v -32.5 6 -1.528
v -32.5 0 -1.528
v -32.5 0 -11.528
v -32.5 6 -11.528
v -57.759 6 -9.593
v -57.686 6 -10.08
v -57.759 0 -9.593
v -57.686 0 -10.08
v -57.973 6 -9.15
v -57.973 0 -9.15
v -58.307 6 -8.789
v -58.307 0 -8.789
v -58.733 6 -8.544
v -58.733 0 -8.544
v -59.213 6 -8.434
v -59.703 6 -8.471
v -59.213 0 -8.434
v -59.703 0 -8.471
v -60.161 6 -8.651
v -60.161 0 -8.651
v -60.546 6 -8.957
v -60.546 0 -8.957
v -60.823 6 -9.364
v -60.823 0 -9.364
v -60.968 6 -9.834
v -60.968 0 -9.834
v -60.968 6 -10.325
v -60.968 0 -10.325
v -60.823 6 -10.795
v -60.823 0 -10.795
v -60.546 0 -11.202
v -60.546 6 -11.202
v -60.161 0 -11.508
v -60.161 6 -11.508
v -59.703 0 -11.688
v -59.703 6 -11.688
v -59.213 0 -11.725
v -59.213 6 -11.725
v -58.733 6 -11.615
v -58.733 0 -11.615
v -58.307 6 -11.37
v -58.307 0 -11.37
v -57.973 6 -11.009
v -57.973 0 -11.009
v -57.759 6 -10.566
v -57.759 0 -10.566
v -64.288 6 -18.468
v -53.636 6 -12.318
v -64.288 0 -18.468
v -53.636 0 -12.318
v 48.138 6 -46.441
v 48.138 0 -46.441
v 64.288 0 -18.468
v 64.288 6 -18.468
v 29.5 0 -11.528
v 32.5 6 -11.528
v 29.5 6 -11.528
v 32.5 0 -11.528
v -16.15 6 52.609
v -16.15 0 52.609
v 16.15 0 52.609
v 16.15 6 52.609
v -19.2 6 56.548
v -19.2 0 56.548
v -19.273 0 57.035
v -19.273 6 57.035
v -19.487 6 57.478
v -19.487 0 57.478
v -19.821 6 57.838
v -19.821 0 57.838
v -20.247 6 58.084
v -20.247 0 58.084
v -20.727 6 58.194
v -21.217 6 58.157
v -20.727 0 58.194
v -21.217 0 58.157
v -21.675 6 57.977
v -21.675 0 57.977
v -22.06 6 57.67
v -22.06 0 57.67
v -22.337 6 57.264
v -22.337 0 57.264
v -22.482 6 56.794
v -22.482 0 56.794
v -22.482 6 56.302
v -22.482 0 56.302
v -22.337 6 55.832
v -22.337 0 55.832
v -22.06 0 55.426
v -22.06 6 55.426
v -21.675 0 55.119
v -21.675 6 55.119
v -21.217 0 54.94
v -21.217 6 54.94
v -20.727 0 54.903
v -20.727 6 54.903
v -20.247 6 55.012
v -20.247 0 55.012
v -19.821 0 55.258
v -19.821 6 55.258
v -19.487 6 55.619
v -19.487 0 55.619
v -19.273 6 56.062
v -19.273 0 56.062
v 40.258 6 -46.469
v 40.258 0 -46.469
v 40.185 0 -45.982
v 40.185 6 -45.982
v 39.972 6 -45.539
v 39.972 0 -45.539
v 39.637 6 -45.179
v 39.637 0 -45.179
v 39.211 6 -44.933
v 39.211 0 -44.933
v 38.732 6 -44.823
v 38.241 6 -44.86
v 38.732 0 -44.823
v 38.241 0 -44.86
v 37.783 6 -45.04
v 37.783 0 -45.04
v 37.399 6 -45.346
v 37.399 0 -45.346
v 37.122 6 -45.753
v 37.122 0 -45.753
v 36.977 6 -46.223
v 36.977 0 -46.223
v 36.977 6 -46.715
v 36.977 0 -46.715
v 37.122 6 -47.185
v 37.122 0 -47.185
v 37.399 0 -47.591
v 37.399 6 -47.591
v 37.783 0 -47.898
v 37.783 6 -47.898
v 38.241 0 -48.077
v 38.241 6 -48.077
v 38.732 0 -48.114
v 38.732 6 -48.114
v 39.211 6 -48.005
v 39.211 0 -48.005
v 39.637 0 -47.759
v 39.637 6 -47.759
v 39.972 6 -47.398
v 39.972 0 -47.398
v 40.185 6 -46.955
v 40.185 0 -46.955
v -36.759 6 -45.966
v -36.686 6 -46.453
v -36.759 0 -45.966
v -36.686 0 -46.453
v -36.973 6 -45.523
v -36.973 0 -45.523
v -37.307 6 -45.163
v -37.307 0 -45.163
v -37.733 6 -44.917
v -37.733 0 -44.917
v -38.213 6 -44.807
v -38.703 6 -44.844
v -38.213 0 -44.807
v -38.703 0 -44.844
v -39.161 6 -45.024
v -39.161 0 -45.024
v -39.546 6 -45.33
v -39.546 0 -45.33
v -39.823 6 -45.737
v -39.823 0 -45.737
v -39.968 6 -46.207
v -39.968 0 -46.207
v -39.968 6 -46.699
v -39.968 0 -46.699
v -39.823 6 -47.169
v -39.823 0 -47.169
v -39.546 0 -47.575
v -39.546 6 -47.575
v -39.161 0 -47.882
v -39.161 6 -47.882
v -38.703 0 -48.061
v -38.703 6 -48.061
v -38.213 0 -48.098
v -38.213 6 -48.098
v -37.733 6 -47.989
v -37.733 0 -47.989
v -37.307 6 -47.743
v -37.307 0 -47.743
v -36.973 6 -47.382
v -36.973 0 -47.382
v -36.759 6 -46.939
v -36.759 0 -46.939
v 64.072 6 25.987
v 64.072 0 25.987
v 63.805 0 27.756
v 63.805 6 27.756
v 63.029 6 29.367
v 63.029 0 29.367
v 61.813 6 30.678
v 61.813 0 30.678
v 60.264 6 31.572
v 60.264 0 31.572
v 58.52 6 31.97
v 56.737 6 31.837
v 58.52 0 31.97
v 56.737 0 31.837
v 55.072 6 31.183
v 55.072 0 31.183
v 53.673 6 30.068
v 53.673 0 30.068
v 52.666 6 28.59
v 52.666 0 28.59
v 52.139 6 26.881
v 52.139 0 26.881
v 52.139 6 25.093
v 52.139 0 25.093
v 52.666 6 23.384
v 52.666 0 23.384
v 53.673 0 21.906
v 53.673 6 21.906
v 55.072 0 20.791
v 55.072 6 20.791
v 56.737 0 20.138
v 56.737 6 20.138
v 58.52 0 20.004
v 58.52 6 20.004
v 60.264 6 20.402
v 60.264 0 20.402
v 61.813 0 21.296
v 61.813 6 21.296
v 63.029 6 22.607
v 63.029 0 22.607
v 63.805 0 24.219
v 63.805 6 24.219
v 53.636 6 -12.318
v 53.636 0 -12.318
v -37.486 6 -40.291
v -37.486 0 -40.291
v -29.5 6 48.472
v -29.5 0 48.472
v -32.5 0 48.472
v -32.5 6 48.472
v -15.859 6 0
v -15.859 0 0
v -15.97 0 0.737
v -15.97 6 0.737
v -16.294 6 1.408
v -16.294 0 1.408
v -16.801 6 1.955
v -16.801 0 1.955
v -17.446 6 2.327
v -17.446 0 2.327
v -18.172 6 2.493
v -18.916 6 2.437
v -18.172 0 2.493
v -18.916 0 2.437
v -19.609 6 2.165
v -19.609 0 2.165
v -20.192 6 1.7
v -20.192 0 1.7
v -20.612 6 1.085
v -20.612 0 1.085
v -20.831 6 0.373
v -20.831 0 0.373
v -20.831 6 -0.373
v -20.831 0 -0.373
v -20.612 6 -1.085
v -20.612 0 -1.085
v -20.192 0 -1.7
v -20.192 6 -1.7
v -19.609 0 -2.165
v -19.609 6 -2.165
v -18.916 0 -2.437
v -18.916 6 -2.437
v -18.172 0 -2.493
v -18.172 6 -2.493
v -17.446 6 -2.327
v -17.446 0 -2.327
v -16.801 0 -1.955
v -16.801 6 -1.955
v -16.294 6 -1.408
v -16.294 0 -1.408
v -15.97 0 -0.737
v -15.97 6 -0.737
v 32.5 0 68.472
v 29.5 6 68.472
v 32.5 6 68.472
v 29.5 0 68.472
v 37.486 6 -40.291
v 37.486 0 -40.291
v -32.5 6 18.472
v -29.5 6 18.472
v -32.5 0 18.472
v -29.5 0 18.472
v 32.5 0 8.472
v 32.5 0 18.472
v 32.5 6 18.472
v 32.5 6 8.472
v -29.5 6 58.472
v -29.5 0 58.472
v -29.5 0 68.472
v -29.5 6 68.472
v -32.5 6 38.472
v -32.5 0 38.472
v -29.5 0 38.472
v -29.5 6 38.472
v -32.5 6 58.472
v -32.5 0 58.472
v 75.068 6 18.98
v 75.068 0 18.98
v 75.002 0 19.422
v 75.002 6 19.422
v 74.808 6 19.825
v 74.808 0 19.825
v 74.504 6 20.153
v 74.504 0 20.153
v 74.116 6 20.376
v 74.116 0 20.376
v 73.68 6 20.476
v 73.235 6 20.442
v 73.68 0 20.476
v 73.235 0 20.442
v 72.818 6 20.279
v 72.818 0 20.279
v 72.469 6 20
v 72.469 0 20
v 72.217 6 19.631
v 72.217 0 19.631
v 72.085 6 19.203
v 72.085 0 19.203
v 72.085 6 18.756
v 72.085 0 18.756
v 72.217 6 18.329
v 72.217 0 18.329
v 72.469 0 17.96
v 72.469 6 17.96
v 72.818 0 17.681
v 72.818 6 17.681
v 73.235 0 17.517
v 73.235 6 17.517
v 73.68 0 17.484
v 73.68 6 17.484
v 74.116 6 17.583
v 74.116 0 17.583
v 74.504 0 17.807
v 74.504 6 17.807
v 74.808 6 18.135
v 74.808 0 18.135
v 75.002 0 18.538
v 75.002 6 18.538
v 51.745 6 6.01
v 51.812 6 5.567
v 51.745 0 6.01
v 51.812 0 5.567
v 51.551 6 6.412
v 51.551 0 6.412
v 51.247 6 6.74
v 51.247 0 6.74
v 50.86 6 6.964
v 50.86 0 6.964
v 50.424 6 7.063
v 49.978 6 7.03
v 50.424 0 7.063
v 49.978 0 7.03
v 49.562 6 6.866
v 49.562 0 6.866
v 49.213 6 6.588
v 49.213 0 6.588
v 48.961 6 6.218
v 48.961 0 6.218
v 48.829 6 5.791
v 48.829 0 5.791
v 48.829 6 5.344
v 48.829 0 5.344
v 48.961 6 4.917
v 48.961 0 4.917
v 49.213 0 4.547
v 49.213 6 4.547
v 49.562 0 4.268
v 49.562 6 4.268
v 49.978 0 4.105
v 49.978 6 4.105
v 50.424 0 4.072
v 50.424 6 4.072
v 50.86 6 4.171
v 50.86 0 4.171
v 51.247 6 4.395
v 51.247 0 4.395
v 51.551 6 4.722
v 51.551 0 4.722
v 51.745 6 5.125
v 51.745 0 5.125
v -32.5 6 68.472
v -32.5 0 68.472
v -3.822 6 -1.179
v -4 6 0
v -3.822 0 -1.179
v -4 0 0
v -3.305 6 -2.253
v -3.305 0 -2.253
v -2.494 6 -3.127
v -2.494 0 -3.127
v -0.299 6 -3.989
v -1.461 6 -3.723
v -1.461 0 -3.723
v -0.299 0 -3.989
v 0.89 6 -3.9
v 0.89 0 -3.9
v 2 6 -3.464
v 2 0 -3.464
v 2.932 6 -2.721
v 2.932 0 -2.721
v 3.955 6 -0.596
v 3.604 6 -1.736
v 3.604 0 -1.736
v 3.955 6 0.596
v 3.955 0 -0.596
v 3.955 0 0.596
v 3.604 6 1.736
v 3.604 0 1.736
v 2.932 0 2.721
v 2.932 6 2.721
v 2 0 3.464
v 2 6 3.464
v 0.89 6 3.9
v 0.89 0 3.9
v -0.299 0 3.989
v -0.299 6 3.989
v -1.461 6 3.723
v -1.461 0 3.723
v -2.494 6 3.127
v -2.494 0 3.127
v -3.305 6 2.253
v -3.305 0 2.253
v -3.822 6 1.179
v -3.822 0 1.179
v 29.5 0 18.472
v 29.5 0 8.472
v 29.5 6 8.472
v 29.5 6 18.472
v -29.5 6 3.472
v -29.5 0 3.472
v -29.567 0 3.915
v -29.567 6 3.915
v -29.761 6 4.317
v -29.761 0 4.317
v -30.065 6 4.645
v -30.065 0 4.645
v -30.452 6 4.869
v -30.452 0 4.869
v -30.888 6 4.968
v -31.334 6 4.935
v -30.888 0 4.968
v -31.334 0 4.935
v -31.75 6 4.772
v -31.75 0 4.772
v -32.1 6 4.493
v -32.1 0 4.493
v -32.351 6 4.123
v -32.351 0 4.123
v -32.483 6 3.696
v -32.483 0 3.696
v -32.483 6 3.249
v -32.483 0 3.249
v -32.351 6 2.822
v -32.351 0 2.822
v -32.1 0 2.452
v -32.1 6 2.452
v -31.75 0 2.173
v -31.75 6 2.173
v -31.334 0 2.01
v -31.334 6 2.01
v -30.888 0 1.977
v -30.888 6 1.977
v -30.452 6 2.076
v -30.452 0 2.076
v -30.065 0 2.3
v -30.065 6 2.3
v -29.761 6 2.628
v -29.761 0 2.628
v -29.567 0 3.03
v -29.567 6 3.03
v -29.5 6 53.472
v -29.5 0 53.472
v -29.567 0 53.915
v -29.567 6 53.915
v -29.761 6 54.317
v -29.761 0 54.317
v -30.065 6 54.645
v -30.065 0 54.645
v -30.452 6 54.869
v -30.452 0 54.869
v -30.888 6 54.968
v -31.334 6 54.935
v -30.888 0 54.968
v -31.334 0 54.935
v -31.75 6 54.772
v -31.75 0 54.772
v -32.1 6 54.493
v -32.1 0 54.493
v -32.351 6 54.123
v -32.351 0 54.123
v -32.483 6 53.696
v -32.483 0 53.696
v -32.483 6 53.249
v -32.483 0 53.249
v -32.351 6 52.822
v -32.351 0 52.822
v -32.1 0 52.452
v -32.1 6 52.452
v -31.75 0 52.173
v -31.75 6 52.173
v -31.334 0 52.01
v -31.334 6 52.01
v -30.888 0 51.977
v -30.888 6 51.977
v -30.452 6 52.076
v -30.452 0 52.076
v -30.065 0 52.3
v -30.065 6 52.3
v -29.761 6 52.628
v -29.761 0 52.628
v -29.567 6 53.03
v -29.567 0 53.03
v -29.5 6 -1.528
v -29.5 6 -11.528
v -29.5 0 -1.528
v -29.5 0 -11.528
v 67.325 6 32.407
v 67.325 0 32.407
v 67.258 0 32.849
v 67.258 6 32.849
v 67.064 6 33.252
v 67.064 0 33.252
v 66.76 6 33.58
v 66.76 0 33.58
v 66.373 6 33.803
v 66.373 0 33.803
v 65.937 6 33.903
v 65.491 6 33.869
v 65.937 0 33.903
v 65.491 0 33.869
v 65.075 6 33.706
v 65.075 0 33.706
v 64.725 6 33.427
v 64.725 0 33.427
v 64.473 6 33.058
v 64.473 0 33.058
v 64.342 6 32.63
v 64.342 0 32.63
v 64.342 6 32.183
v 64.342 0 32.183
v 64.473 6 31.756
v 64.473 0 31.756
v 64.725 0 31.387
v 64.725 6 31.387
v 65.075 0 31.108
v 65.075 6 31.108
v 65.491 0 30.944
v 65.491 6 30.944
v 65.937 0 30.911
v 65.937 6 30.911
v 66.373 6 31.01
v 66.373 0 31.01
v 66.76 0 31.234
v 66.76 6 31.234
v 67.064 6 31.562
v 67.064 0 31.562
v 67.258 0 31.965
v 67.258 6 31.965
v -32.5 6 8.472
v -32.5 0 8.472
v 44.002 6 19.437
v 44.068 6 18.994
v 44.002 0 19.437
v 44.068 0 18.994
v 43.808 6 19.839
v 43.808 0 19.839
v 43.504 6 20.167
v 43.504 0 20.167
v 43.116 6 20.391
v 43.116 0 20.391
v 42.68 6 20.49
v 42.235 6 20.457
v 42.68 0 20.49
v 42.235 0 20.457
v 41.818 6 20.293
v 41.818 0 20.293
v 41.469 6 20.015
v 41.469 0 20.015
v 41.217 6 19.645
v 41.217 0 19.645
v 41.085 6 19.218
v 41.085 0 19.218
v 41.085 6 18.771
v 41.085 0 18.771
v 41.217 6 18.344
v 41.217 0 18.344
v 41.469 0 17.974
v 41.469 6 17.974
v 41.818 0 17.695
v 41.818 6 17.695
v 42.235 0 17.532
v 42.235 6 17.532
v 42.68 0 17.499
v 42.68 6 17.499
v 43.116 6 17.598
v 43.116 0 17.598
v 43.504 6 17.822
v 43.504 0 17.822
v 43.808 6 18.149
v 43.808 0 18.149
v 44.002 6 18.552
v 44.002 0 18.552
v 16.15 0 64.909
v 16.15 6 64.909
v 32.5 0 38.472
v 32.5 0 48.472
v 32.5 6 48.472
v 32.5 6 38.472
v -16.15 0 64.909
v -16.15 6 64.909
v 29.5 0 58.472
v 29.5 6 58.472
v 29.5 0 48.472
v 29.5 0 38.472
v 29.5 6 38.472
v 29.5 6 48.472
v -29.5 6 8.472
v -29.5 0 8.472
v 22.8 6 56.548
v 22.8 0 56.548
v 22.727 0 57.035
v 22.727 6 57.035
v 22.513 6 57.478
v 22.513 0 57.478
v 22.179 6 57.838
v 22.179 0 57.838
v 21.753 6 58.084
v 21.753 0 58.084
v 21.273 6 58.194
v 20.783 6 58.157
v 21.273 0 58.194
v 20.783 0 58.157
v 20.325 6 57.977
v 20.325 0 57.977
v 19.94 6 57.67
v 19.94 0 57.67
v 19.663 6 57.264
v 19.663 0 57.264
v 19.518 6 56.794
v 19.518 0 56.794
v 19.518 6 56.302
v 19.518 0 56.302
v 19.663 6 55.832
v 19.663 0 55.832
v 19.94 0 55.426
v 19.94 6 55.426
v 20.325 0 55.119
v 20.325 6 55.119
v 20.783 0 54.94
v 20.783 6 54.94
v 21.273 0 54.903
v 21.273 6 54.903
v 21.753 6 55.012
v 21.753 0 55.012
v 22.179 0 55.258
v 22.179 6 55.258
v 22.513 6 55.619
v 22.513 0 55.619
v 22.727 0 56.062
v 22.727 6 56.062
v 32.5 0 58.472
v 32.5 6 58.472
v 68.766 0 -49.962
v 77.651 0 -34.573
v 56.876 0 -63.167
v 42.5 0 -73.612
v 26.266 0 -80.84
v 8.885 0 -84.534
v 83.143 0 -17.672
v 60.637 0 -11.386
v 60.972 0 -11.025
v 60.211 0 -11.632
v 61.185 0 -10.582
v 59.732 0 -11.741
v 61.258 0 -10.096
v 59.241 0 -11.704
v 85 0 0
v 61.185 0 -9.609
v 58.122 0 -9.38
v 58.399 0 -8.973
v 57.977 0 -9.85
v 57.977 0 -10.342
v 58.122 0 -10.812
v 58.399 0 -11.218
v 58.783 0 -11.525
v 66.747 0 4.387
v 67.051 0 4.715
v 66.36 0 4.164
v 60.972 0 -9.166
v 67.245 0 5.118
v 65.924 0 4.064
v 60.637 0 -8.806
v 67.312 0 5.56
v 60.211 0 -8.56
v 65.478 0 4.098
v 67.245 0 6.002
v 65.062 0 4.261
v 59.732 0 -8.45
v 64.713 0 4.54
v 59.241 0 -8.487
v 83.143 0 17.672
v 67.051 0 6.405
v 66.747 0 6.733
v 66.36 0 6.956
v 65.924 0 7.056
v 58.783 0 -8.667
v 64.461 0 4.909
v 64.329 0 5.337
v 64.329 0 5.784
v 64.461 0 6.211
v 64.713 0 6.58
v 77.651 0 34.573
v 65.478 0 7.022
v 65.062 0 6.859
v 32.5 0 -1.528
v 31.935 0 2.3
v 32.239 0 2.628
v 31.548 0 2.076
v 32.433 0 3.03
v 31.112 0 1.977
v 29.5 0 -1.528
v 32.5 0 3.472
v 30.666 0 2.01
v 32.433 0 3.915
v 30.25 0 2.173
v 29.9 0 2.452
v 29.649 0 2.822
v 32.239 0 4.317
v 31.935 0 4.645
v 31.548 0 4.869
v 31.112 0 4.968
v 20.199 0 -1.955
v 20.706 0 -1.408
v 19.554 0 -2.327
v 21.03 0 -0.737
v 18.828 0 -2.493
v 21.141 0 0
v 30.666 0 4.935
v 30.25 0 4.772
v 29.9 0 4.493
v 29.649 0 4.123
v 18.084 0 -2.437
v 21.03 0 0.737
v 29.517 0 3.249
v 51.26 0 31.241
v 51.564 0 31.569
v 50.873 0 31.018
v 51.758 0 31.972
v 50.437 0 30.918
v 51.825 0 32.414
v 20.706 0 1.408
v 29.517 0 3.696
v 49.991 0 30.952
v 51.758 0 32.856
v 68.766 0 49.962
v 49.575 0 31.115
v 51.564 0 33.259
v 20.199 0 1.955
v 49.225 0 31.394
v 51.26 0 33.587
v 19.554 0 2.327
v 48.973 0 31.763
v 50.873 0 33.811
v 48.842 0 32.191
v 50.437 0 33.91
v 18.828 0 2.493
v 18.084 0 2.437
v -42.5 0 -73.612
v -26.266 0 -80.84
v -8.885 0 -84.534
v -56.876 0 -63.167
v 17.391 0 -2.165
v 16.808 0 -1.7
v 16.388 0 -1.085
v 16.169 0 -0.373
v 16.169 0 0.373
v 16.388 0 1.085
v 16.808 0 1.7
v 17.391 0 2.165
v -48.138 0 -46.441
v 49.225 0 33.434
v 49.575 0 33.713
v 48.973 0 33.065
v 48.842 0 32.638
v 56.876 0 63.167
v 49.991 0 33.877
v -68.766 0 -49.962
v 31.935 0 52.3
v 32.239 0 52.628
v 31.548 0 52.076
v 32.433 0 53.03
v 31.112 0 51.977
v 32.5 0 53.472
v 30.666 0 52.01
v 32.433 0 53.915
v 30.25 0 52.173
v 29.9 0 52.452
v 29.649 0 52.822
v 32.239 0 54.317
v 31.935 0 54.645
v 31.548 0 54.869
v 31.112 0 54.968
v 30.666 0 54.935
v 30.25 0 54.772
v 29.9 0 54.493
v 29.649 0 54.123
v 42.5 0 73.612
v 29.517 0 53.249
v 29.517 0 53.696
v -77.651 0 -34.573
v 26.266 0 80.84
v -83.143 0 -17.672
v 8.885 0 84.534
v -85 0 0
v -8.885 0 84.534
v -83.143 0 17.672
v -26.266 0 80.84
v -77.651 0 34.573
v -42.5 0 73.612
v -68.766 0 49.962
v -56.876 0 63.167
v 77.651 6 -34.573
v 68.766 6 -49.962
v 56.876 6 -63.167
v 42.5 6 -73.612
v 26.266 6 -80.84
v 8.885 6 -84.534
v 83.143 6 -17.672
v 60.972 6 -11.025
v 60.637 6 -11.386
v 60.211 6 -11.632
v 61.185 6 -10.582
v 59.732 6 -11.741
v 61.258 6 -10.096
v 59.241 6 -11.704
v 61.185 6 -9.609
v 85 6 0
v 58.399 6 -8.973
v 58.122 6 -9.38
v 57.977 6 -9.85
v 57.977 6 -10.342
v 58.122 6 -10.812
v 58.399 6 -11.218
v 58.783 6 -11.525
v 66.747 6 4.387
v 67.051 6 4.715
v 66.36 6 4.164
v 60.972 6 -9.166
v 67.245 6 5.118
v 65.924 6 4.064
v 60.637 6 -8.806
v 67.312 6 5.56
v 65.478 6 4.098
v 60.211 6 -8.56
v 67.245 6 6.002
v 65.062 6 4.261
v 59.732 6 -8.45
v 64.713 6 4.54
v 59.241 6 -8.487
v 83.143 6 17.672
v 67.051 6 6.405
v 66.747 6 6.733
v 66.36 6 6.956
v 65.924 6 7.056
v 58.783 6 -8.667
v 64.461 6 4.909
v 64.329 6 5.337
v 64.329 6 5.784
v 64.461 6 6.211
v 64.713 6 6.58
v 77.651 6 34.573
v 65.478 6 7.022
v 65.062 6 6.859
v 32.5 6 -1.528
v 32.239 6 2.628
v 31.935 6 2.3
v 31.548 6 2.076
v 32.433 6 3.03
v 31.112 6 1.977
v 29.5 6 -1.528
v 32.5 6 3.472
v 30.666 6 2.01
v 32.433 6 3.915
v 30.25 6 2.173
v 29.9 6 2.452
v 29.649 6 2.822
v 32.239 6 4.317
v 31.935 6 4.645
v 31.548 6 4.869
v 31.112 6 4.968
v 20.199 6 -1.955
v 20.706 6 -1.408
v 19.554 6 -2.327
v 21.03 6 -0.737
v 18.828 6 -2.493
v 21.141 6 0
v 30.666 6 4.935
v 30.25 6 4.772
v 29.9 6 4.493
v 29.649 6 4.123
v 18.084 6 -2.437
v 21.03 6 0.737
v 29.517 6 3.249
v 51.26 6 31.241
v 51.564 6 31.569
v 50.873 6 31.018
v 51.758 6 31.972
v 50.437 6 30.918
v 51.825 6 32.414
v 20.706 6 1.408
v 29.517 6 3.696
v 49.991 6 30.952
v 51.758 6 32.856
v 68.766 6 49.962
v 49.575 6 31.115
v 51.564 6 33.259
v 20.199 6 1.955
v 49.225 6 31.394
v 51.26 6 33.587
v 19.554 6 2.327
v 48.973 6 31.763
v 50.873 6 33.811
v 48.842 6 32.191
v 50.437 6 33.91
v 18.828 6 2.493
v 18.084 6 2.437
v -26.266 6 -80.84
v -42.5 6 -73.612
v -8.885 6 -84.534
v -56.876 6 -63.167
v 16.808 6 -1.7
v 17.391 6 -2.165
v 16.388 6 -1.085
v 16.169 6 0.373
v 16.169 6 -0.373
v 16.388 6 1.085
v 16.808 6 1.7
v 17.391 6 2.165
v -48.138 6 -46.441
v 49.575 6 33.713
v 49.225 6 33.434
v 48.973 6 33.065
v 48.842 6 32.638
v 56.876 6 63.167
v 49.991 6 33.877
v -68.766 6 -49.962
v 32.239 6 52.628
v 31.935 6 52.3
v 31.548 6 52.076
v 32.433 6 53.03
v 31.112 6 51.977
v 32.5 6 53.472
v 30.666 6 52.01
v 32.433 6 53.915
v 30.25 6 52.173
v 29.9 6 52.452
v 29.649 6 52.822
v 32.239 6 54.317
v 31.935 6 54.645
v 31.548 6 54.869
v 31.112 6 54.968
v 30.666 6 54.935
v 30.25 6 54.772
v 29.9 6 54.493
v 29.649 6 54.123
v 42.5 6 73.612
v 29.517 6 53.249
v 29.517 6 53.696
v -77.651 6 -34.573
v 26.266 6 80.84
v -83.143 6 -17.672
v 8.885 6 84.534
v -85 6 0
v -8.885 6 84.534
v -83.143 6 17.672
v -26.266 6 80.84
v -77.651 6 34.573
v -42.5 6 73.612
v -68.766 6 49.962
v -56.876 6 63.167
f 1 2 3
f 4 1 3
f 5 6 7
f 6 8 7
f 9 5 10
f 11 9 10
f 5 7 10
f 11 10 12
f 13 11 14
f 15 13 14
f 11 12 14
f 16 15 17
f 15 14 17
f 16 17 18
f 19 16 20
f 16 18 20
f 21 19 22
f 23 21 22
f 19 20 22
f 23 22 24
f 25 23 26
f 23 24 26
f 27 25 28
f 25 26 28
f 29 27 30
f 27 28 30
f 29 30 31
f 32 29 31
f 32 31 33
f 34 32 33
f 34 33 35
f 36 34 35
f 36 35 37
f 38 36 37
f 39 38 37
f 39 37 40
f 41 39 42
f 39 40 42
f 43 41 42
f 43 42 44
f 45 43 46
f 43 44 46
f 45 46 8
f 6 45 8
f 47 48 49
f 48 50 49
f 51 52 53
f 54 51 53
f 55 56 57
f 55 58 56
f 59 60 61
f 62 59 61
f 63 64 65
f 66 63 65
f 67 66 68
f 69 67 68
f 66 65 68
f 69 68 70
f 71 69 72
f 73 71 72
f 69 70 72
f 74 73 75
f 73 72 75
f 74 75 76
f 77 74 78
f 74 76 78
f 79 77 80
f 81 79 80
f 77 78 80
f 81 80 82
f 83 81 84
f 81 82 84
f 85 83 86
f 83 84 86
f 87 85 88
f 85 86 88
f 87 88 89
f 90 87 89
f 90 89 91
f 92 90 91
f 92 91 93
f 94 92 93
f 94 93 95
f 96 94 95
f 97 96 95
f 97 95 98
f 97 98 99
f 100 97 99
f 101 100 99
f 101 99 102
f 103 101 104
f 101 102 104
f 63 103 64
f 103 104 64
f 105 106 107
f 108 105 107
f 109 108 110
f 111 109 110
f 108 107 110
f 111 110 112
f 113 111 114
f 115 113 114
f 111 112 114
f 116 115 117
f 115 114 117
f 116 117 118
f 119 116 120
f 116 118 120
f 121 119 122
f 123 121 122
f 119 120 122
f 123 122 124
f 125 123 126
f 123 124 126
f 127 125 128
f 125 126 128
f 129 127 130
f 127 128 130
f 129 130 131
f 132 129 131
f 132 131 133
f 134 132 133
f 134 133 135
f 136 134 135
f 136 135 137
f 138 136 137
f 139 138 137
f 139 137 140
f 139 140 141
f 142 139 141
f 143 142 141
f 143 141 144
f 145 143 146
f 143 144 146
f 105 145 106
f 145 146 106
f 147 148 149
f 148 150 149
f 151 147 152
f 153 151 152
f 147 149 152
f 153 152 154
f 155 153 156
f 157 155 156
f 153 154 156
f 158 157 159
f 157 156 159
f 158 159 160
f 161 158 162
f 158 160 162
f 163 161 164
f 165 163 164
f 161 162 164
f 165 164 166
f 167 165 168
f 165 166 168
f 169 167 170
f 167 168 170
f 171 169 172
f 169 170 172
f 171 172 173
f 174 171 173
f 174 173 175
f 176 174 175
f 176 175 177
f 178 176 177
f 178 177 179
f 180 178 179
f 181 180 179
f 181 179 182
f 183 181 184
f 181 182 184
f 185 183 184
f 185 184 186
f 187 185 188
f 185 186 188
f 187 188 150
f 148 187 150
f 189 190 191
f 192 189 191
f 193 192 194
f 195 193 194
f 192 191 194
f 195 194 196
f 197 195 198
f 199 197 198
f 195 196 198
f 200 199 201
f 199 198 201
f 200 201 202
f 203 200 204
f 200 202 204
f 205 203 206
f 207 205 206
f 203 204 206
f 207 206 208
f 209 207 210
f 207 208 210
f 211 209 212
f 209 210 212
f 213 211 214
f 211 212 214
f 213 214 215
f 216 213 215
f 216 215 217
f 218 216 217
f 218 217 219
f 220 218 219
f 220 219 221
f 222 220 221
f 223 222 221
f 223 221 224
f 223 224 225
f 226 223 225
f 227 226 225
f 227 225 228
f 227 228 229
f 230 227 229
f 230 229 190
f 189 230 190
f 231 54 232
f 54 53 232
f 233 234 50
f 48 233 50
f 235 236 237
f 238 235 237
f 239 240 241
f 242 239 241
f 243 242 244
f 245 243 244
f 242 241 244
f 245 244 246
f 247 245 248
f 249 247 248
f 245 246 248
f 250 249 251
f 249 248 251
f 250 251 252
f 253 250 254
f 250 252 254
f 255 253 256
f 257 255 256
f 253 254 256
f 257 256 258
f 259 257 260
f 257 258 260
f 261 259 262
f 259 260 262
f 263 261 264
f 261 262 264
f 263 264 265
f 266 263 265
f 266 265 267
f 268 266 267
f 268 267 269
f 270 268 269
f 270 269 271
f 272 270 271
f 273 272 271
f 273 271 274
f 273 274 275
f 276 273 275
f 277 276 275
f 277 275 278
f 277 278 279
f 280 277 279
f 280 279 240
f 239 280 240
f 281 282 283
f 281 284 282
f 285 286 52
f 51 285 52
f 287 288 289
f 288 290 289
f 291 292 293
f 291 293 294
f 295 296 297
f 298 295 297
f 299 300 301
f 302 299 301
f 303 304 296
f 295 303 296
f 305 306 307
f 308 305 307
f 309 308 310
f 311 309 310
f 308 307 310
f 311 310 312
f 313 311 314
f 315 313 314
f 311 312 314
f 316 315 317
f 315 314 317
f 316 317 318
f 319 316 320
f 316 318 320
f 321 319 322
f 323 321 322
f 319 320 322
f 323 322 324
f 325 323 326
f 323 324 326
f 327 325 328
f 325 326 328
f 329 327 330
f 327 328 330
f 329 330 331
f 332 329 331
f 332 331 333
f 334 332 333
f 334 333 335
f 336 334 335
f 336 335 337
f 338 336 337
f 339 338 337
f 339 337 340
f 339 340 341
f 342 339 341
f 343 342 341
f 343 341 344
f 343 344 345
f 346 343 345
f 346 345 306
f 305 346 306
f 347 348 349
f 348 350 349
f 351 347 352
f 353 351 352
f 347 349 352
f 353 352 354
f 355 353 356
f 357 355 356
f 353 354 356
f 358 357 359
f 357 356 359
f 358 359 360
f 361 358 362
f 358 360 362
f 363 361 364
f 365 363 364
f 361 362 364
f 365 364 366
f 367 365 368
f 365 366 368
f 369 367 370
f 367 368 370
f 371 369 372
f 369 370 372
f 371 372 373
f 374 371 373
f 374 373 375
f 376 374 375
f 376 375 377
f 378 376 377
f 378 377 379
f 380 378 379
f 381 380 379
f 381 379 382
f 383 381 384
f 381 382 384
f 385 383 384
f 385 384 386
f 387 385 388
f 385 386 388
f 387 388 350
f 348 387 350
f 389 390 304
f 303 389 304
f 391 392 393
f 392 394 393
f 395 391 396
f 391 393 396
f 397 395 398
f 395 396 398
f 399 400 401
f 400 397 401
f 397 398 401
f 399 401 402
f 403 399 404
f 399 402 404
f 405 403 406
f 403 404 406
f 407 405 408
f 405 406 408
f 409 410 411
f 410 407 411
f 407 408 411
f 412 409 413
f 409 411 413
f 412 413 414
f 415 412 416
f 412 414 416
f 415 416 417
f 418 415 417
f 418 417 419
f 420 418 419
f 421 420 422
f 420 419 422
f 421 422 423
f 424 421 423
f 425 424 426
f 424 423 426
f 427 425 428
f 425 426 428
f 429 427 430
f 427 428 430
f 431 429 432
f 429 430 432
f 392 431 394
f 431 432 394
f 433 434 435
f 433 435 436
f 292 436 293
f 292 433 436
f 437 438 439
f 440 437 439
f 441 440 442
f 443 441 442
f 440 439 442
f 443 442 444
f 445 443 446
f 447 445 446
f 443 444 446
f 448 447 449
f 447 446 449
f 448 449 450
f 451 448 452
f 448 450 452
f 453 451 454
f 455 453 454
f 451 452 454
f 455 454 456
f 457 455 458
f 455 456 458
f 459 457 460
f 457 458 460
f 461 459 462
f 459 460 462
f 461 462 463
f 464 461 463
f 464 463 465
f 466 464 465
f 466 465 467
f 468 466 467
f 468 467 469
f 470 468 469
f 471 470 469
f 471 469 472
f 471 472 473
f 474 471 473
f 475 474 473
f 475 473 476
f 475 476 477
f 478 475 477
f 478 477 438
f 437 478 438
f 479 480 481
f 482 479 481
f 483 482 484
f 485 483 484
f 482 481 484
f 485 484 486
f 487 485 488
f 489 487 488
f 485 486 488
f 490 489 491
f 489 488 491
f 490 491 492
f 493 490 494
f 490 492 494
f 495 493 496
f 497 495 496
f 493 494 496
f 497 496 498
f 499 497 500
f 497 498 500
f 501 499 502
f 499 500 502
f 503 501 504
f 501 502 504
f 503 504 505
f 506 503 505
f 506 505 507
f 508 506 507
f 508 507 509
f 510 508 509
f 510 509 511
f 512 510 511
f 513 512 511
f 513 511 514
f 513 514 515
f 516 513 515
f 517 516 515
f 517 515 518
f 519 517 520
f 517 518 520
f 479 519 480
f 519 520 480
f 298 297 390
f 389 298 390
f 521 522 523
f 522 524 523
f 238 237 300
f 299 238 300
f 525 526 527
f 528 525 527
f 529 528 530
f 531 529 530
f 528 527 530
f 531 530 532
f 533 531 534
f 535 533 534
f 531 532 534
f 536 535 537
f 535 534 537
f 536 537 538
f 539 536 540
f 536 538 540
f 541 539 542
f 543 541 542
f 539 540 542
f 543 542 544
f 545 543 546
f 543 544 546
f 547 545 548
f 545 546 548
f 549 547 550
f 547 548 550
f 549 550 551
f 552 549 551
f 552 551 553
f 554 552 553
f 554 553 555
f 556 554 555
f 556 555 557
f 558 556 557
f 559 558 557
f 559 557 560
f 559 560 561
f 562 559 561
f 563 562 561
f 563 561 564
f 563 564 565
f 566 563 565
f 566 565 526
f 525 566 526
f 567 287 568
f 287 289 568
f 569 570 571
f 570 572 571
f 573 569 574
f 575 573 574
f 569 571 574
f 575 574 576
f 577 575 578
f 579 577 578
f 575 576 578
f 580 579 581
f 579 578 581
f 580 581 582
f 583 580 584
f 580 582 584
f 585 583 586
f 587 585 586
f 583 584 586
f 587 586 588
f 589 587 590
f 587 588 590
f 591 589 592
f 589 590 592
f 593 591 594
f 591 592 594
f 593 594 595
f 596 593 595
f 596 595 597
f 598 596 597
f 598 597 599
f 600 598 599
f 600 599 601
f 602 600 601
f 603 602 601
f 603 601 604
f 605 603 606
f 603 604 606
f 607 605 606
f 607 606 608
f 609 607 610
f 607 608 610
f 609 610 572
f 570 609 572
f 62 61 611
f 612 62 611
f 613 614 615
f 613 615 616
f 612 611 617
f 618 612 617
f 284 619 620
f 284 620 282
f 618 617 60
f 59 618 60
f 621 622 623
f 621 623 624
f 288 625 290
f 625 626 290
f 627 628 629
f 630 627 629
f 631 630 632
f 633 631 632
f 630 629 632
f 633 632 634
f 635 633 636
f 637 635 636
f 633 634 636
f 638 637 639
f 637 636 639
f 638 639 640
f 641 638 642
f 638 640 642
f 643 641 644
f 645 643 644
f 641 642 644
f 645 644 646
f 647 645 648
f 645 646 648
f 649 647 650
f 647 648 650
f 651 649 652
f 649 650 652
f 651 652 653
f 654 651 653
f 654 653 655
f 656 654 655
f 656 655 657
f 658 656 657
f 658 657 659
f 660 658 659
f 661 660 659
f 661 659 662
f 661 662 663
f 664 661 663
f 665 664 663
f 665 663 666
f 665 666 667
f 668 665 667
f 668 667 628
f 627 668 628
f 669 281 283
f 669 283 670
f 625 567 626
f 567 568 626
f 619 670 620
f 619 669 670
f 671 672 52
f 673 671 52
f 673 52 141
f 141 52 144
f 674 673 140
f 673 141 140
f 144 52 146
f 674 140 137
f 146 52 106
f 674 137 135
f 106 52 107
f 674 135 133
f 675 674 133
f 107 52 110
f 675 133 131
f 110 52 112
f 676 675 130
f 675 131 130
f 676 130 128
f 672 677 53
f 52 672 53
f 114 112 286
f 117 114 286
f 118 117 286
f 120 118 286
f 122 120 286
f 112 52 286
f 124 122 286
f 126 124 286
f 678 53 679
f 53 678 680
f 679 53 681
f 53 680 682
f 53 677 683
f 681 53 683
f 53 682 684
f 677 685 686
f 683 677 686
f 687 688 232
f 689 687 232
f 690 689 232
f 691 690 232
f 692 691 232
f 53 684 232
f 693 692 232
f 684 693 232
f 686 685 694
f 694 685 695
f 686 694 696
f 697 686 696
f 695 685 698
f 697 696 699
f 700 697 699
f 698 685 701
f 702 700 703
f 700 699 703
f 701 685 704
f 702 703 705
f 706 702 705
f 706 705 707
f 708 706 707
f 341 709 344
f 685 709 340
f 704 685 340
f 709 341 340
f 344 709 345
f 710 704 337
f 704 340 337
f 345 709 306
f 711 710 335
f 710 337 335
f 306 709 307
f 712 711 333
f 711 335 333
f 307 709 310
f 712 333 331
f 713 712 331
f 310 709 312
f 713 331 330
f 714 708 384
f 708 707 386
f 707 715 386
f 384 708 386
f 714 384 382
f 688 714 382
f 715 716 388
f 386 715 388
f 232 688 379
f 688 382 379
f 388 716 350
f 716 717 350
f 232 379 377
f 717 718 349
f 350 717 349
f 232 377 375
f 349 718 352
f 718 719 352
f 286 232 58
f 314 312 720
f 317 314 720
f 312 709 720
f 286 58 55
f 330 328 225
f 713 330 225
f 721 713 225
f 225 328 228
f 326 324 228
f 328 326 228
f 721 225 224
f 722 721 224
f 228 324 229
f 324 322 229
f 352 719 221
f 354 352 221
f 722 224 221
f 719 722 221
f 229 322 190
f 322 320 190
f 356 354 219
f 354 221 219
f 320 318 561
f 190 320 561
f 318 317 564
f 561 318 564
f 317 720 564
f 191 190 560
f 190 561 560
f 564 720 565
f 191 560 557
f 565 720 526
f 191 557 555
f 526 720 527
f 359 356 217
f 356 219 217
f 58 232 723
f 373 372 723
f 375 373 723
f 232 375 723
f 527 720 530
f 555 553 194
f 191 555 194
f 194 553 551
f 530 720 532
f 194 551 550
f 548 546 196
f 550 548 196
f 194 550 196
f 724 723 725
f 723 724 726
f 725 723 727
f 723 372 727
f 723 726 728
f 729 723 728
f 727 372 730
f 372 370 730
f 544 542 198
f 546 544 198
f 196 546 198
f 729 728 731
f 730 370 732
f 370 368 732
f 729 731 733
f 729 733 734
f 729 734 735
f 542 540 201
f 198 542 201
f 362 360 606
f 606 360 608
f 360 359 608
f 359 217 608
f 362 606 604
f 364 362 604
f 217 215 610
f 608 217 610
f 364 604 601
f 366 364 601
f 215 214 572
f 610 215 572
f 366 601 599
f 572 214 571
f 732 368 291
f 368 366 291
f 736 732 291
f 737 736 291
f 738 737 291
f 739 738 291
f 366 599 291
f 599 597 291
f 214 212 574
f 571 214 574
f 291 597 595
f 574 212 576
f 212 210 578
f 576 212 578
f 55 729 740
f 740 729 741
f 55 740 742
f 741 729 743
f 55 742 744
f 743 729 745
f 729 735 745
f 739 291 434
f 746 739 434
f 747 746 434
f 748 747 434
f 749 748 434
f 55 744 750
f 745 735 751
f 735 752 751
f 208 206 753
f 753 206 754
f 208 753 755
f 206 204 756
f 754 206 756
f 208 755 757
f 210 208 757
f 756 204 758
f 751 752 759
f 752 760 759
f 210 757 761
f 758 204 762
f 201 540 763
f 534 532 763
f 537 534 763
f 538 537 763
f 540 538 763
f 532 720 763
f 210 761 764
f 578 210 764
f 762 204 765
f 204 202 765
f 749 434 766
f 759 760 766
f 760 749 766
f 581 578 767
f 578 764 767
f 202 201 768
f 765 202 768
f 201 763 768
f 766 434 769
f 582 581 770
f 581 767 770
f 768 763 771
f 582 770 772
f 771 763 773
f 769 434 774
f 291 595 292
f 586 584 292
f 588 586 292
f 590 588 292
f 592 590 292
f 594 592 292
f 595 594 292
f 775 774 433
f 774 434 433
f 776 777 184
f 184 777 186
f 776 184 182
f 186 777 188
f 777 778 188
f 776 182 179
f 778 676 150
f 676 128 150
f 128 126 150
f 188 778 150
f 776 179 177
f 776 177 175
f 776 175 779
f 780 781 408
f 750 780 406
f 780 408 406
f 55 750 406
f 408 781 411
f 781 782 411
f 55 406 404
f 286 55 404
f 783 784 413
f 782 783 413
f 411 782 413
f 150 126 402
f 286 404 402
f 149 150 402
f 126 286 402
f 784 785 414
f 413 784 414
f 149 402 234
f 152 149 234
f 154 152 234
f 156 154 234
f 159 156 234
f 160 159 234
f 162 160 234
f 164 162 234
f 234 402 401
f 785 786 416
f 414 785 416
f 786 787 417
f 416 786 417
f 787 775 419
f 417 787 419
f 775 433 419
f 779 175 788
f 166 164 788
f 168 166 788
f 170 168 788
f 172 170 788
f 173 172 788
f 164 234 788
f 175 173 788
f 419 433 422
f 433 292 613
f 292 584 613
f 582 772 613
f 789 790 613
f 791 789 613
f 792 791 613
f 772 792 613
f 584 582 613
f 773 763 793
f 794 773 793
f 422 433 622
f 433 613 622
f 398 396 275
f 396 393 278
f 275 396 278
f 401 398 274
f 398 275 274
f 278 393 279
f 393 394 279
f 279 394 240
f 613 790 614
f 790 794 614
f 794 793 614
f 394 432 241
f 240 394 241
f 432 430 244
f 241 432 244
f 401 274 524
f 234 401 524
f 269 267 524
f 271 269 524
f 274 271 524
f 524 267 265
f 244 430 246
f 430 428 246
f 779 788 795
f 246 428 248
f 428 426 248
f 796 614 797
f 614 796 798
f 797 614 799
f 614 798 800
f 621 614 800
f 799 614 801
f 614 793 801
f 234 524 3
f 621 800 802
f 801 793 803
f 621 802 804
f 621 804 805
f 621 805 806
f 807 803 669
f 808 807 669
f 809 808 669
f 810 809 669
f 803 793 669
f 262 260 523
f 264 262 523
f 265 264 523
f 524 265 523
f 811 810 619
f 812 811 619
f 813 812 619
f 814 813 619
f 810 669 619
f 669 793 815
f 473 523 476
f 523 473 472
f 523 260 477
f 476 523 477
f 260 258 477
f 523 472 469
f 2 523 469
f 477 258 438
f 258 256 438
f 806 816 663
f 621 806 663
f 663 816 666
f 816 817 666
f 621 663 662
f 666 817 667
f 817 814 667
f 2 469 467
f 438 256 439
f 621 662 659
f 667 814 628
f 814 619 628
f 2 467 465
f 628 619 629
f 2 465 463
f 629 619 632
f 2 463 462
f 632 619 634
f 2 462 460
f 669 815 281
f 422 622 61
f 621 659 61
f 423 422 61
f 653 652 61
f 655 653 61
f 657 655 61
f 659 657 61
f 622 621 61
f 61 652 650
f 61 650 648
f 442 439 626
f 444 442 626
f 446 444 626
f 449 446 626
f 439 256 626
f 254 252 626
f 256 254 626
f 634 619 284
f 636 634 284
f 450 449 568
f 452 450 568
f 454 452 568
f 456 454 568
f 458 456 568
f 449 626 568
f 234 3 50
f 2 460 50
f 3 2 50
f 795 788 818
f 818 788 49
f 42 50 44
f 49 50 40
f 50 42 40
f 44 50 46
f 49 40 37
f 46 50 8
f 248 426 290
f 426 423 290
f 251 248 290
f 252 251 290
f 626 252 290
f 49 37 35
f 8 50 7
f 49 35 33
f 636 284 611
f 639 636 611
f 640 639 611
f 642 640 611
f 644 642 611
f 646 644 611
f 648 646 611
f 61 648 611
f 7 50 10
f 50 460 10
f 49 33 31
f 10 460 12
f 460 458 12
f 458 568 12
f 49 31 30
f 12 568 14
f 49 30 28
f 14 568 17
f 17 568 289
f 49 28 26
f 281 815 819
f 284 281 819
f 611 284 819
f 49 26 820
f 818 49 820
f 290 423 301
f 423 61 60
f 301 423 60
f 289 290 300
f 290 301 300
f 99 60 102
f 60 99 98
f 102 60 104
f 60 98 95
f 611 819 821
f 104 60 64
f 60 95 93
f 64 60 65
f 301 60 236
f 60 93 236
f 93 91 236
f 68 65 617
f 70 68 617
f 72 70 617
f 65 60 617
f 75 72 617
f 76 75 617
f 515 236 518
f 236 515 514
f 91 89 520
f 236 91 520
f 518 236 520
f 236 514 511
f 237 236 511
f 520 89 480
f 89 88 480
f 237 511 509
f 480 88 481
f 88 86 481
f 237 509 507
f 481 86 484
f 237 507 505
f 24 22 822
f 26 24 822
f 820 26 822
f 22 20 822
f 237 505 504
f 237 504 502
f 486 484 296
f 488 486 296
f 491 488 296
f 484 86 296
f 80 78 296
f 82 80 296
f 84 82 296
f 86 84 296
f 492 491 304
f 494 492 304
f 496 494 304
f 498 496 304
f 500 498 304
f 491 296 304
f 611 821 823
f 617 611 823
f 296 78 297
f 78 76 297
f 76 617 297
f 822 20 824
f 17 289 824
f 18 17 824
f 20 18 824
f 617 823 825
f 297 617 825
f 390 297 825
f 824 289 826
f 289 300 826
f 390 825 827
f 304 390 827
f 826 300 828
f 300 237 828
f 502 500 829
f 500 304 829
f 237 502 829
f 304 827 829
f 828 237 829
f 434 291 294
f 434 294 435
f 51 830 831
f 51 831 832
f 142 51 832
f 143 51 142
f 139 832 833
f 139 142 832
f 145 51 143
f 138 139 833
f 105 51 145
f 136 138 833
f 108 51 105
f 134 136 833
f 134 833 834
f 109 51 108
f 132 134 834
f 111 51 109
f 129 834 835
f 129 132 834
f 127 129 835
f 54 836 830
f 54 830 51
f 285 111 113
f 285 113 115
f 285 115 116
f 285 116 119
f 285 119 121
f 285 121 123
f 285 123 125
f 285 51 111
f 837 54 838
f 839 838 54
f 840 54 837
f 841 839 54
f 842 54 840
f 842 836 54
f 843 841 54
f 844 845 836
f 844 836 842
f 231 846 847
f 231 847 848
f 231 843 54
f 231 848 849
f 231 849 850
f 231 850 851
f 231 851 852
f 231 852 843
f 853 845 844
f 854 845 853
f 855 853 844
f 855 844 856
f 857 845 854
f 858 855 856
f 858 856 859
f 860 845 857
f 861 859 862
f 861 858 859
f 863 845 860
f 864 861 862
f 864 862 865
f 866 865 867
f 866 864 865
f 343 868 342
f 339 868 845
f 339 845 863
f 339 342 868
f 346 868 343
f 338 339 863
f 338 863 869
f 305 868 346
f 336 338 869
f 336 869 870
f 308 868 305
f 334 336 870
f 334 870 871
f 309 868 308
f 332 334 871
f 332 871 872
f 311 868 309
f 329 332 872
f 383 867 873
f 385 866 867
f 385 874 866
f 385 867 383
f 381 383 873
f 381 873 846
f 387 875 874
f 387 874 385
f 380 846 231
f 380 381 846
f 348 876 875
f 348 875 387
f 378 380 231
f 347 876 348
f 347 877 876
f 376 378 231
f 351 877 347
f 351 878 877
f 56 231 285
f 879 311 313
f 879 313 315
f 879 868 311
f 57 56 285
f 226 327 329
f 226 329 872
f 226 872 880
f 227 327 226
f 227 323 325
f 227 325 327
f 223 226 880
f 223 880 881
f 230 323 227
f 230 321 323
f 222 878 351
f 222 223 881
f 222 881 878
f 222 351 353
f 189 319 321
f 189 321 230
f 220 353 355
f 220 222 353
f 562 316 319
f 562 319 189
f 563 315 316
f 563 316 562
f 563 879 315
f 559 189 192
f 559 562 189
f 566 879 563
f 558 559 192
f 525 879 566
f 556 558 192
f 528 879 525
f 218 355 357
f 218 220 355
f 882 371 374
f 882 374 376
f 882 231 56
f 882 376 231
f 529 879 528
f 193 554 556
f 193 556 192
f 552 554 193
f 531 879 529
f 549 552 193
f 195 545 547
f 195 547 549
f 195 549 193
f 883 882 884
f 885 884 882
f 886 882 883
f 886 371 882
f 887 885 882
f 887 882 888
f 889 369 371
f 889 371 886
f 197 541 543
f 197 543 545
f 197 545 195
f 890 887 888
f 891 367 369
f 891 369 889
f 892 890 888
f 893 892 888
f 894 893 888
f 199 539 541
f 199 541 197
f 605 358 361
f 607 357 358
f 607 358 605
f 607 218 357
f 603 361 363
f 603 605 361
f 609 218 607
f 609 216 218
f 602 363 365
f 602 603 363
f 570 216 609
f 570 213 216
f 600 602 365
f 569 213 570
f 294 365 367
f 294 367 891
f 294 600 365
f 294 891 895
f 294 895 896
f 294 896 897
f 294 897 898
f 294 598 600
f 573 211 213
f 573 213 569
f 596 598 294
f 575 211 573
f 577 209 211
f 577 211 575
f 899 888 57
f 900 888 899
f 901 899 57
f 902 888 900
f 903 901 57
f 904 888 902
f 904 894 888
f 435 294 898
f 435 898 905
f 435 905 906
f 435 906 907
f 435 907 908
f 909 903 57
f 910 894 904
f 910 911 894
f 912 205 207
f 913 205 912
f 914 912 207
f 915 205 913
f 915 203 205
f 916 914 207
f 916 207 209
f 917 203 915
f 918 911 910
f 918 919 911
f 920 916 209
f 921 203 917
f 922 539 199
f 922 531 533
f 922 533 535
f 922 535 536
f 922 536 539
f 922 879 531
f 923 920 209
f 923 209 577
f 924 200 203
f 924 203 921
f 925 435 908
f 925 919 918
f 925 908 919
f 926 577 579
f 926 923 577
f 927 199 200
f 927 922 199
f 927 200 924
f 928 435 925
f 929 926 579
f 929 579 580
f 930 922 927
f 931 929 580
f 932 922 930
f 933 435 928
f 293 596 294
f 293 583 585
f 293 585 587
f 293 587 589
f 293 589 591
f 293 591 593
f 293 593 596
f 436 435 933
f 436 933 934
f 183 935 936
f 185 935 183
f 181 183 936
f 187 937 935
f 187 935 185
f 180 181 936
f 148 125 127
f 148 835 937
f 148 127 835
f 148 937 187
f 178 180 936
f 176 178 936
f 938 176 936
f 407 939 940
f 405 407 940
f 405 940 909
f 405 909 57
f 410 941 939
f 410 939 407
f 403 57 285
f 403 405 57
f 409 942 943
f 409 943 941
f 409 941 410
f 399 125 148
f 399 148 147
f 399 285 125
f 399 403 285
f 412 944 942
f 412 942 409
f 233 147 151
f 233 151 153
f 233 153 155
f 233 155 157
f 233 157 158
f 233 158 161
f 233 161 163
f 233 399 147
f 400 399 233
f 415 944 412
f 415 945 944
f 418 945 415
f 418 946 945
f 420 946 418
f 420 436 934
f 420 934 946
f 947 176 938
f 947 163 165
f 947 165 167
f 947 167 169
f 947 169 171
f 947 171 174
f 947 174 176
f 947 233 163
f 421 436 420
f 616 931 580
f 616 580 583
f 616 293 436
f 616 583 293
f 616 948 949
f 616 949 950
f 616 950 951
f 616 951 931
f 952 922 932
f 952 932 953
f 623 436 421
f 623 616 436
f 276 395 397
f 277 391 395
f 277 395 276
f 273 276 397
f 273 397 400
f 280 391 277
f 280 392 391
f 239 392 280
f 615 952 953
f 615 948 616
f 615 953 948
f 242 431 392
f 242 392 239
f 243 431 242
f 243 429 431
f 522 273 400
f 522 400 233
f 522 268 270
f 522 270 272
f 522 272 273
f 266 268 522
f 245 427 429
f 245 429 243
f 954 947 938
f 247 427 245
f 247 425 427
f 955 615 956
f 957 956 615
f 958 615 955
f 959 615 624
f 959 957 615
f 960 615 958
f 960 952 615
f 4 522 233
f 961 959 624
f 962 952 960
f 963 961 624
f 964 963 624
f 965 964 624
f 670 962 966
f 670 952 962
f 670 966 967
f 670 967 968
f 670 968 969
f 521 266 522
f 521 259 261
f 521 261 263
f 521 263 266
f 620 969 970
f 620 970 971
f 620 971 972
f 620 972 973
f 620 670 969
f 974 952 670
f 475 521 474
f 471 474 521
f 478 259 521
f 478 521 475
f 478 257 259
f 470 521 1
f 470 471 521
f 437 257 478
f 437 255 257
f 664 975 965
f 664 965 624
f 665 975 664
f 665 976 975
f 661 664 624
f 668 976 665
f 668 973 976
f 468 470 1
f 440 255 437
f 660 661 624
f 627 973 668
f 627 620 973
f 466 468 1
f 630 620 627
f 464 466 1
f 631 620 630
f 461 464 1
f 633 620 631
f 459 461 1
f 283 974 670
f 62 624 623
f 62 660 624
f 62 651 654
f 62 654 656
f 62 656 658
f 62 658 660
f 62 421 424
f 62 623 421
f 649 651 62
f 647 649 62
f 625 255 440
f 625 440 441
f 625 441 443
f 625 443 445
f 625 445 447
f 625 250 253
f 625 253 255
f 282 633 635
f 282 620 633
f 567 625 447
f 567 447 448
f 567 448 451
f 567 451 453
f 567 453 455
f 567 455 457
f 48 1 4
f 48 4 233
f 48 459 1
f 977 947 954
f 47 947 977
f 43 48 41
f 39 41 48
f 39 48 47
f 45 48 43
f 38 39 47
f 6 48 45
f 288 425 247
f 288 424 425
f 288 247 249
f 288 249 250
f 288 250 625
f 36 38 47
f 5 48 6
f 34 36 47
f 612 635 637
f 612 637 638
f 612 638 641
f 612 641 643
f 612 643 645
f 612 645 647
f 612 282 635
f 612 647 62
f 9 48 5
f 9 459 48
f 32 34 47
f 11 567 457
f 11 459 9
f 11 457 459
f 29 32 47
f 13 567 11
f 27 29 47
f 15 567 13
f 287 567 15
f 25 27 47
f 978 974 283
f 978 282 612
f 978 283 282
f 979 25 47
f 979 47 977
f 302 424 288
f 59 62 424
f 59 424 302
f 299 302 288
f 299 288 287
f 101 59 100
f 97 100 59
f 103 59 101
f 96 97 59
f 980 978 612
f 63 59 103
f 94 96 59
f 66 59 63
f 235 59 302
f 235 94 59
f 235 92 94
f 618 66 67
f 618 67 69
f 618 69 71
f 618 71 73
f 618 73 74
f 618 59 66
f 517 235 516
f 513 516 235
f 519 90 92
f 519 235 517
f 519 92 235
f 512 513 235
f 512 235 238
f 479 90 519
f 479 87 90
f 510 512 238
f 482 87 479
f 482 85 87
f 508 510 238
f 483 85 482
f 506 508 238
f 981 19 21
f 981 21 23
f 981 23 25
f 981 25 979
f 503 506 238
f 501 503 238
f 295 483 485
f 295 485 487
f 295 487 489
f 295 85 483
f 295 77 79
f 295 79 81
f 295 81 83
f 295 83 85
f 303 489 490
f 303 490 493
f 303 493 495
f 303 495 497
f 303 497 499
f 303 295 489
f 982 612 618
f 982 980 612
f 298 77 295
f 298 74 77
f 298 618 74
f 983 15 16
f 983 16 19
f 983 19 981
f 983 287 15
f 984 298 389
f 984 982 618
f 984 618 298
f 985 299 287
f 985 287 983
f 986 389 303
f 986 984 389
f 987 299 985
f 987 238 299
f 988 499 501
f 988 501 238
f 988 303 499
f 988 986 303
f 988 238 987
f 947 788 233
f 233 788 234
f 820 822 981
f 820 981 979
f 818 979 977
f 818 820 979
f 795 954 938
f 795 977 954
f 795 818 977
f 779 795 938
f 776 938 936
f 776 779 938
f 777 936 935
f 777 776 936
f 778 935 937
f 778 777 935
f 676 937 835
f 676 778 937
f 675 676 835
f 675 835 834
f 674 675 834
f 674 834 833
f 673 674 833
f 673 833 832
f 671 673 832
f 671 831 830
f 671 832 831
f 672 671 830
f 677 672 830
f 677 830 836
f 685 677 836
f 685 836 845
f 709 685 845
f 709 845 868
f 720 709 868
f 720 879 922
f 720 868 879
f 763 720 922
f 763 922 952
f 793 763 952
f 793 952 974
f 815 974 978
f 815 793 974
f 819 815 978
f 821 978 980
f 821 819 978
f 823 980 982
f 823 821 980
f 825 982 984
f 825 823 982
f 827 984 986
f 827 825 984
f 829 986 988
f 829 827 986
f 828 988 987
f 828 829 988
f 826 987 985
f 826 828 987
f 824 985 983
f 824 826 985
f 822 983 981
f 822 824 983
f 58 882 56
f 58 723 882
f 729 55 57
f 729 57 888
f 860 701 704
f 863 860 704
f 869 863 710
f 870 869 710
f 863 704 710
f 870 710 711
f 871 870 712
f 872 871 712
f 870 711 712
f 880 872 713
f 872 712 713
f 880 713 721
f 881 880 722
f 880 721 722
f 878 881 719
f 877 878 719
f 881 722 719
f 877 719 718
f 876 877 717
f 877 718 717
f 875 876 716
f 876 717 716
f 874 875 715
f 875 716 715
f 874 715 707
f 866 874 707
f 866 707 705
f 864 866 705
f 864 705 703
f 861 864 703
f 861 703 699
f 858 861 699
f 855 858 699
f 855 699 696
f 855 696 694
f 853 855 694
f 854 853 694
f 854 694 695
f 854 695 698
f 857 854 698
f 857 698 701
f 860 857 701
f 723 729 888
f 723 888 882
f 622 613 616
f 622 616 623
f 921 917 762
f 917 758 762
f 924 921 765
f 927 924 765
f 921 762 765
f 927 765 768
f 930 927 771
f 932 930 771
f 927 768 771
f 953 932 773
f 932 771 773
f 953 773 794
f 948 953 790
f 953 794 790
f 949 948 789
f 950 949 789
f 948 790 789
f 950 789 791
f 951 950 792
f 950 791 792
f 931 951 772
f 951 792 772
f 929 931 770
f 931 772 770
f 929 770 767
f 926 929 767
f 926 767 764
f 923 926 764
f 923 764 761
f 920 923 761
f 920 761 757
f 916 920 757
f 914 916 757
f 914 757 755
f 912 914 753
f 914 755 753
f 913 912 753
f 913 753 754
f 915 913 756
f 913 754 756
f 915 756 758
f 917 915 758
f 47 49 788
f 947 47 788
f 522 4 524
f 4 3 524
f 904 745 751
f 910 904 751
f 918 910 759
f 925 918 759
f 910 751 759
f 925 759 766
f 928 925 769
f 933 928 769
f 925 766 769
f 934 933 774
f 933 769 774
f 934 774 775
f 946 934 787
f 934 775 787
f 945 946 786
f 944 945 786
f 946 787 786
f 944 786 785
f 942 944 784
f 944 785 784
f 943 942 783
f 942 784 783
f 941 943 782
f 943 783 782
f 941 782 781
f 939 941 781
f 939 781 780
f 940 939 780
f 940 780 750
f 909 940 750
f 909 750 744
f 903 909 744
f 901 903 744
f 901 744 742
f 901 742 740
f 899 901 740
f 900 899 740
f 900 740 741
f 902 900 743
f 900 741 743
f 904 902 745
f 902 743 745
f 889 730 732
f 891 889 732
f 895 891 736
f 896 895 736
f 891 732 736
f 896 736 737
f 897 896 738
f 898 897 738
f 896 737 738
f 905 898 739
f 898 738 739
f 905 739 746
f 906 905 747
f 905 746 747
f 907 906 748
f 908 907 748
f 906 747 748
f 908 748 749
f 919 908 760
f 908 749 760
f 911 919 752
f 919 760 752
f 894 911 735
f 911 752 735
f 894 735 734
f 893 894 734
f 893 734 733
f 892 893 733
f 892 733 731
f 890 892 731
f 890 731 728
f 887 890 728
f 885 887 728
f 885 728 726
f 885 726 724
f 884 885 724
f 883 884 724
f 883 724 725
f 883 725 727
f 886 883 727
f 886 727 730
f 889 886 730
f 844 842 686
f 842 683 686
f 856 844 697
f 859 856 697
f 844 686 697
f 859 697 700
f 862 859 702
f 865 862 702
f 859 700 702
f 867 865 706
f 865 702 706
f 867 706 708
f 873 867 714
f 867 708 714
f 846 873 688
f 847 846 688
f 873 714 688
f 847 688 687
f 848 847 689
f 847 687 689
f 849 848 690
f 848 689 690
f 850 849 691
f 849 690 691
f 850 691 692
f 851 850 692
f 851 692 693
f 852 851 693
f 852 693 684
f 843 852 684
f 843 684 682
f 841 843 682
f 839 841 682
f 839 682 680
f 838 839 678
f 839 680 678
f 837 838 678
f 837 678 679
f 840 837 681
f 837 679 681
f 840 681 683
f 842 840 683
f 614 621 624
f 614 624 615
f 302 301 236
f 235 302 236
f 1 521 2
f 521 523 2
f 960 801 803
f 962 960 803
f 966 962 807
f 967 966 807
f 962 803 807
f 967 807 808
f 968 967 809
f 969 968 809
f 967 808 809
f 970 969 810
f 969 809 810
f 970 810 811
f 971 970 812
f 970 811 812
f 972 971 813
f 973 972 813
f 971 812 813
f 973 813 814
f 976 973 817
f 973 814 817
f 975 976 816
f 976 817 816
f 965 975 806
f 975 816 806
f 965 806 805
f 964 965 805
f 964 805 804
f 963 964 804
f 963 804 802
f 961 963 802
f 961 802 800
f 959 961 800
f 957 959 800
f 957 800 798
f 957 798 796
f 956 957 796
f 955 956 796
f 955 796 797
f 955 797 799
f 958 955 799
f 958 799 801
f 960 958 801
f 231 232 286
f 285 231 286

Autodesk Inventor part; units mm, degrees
ref_plane "YZ Plane" through (0, 0, 0) normal (1, 0, 0) x (0, 1, 0)
ref_plane "XZ Plane" through (0, 0, 0) normal (0, 1, 0) x (-1, 0, 0)
ref_plane "XY Plane" through (0, 0, 0) normal (0, 0, 1) x (1, 0, 0)
sketch "Эскиз1" plane through (0, 0, 0) normal (0, 1, 0) x (-1, 0, 0)
  circle A0 centre (0, 0) radius 85
  circle A1 centre (0, 0) radius 4
  dimension "d0" = 170
  dimension "d15" = 8
extrude "Выдавливание1" add sketch "Эскиз1" along normal blind 6
sketch "Эскиз2" plane through (0, 0, 0) normal (0, -1, 0) x (1, 0, 0)
  circle A0 centre (0, 0) radius 4
  circle A1 centre (0, 0) radius 117.5181 construction
  line L0 (101.7737, 58.7591) -> (0, -117.5181) construction
  line L1 (0, -117.5181) -> (-101.7737, 58.7591) construction
  line L2 (-101.7737, 58.7591) -> (101.7737, 58.7591) construction
  line L3 (16.15, 64.9091) -> (-16.15, 64.9091)
  line L4 (-16.15, 64.9091) -> (-16.15, 52.6091)
  line L5 (-16.15, 52.6091) -> (16.15, 52.6091)
  line L6 (16.15, 52.6091) -> (16.15, 64.9091)
  line L7 (16.15, 64.9091) -> (-16.15, 52.6091) construction
  line L8 (-16.15, 64.9091) -> (16.15, 52.6091) construction
  line L9 (-16.15, 58.7591) -> (16.15, 58.7591) construction
  line L10 (-64.2879, -18.4682) -> (-48.1379, -46.4408)
  line L11 (-37.4858, -40.2908) -> (-53.6358, -12.3182)
  line L12 (-53.6358, -12.3182) -> (-64.2879, -18.4682)
  line L13 (-48.1379, -46.4408) -> (-37.4858, -40.2908)
  line L14 (-64.2879, -18.4682) -> (-37.4858, -40.2908) construction
  line L15 (-48.1379, -46.4408) -> (-53.6358, -12.3182) construction
  line L16 (48.1379, -46.4408) -> (64.2879, -18.4682)
  line L17 (53.6358, -12.3182) -> (37.4858, -40.2908)
  line L18 (37.4858, -40.2908) -> (48.1379, -46.4408)
  line L19 (64.2879, -18.4682) -> (53.6358, -12.3182)
  line L20 (48.1379, -46.4408) -> (53.6358, -12.3182) construction
  line L21 (64.2879, -18.4682) -> (37.4858, -40.2908) construction
  circle A2 centre (58.0718, 25.9871) radius 6
  circle A3 centre (18.6407, 0) radius 2.5
  circle A4 centre (-18.3593, 0) radius 2.5
  point P0 (0, 58.7591)
  point P1 (-58.9618, -15.3932)
  point P2 (-42.8118, -43.3658)
  point P3 (-50.8868, -29.3795)
  point P4 (42.8118, -43.3658)
  point P5 (58.9618, -15.3932)
  point P6 (50.8868, -29.3795)
  dimension "d16" = 32.3
  dimension "d17" = 12.3
  dimension "d20" = 360
  dimension "d25" = 12
  dimension "d26" = 5
  dimension "d27" = 5
  dimension "d28" = 37
extrude "Выдавливание3" cut sketch "Эскиз2" against normal blind 6 contours L6 L5 L4 L3 | L12 L11 L13 L10 | L18 L17 L19 L16 | A2 | A3 | A4
sketch "Эскиз3" plane through (0, 0, 0) normal (0, -1, 0) x (1, 0, 0)
  point P0 (0, 0)
sketch "Эскиз4" plane through (0, 0, 0) normal (0, -1, 0) x (1, 0, 0)
  point P0 (0, 0)
sketch "Эскиз5" plane through (0, 0, 0) normal (0, -1, 0) x (1, 0, 0)
  circle A0 centre (65.8248, 32.4068) radius 1.25 construction
  circle A1 centre (73.5684, 18.9798) radius 1.25 construction
  circle A2 centre (50.3248, 32.4142) radius 1.25 construction
  circle A3 centre (65.8121, 5.5601) radius 1.25 construction
  circle A4 centre (61.3843, 6.6933) radius 1.19 construction
  circle A5 centre (65.8121, 5.5601) radius 1.25 construction
  circle A6 centre (50.3121, 5.5674) radius 1.25 construction
  circle A7 centre (42.5684, 18.9944) radius 1.25 construction
  circle A8 centre (50.3248, 32.4142) radius 1.25 construction
  circle A9 centre (73.5684, 18.9798) radius 1.5
  circle A10 centre (65.8121, 5.5601) radius 1.5
  circle A11 centre (50.3121, 5.5674) radius 1.5
  circle A12 centre (42.5684, 18.9944) radius 1.5
  circle A13 centre (50.3248, 32.4142) radius 1.5
  circle A14 centre (65.8248, 32.4068) radius 1.5
  point P0 (0, 0)
  dimension "d29" = 3
  dimension "d30" = 3
  dimension "d31" = 3
  dimension "d32" = 3
  dimension "d33" = 3
  dimension "d34" = 3
extrude "Выдавливание4" cut sketch "Эскиз5" against normal blind 10
sketch "Эскиз6" plane through (0, 0, 0) normal (0, -1, 0) x (1, 0, 0)
  circle A0 centre (-59.3361, -10.0795) radius 1.65
  circle A1 centre (-38.3361, -46.4526) radius 1.65
  circle A2 centre (38.6083, -46.4687) radius 1.65
  circle A3 centre (59.6083, -10.0956) radius 1.65
  circle A4 centre (21.15, 56.5482) radius 1.65
  circle A5 centre (-20.85, 56.5482) radius 1.65
  point P0 (0, 0)
extrude "Выдавливание5" cut sketch "Эскиз6" against normal blind 10
sketch "Эскиз10" plane through (0, 0, 0) normal (0, -1, 0) x (1, 0, 0)
  line L0 (29.5, 68.4725) -> (32.5, 68.4725)
  line L1 (29.5, 58.4725) -> (29.5, 68.4725)
  line L2 (32.5, 58.4725) -> (29.5, 58.4725)
  line L3 (32.5, 68.4725) -> (32.5, 58.4725)
  line L4 (29.5, 48.4725) -> (32.5, 48.4725)
  line L5 (29.5, 38.4725) -> (29.5, 48.4725)
  line L6 (32.5, 38.4725) -> (29.5, 38.4725)
  line L7 (32.5, 48.4725) -> (32.5, 38.4725)
  line L8 (29.5, 18.4725) -> (32.5, 18.4725)
  line L9 (29.5, 8.4725) -> (29.5, 18.4725)
  line L10 (32.5, 8.4725) -> (29.5, 8.4725)
  line L11 (32.5, 18.4725) -> (32.5, 8.4725)
  line L12 (29.5, -1.5275) -> (32.5, -1.5275)
  line L13 (29.5, -11.5275) -> (29.5, -1.5275)
  line L14 (32.5, -11.5275) -> (29.5, -11.5275)
  line L15 (32.5, -1.5275) -> (32.5, -11.5275)
  line L16 (-29.5, -1.5275) -> (-32.5, -1.5275)
  line L17 (-32.5, -1.5275) -> (-32.5, -11.5275)
  line L18 (-32.5, -11.5275) -> (-29.5, -11.5275)
  line L19 (-29.5, -11.5275) -> (-29.5, -1.5275)
  line L20 (-29.5, 18.4725) -> (-32.5, 18.4725)
  line L21 (-32.5, 18.4725) -> (-32.5, 8.4725)
  line L22 (-32.5, 8.4725) -> (-29.5, 8.4725)
  line L23 (-29.5, 8.4725) -> (-29.5, 18.4725)
  line L24 (-29.5, 48.4725) -> (-32.5, 48.4725)
  line L25 (-32.5, 48.4725) -> (-32.5, 38.4725)
  line L26 (-32.5, 38.4725) -> (-29.5, 38.4725)
  line L27 (-29.5, 38.4725) -> (-29.5, 48.4725)
  line L28 (-29.5, 68.4725) -> (-32.5, 68.4725)
  line L29 (-32.5, 68.4725) -> (-32.5, 58.4725)
  line L30 (-32.5, 58.4725) -> (-29.5, 58.4725)
  line L31 (-29.5, 58.4725) -> (-29.5, 68.4725)
  circle A0 centre (-31, 53.4725) radius 1.5
  circle A1 centre (-31, 3.4725) radius 1.5
  circle A2 centre (31, 53.4725) radius 1.5
  circle A3 centre (31, 3.4725) radius 1.5
  line L32 (-31, 58.4725) -> (-31, 48.4725) construction
  line L33 (-31, 8.4725) -> (-31, -1.5275) construction
  line L34 (31, -1.5275) -> (31, 8.4725) construction
  line L35 (31, 48.4725) -> (31, 58.4725) construction
  point P0 (0, 0)
  point P1 (-31, 53.4725)
  point P2 (-31, 3.4725)
  point P3 (31, 3.4725)
  dimension "d57" = 3
extrude "Выдавливание9" cut sketch "Эскиз10" against normal up to surface (6 mm away)
properties part number "Fanerka"
